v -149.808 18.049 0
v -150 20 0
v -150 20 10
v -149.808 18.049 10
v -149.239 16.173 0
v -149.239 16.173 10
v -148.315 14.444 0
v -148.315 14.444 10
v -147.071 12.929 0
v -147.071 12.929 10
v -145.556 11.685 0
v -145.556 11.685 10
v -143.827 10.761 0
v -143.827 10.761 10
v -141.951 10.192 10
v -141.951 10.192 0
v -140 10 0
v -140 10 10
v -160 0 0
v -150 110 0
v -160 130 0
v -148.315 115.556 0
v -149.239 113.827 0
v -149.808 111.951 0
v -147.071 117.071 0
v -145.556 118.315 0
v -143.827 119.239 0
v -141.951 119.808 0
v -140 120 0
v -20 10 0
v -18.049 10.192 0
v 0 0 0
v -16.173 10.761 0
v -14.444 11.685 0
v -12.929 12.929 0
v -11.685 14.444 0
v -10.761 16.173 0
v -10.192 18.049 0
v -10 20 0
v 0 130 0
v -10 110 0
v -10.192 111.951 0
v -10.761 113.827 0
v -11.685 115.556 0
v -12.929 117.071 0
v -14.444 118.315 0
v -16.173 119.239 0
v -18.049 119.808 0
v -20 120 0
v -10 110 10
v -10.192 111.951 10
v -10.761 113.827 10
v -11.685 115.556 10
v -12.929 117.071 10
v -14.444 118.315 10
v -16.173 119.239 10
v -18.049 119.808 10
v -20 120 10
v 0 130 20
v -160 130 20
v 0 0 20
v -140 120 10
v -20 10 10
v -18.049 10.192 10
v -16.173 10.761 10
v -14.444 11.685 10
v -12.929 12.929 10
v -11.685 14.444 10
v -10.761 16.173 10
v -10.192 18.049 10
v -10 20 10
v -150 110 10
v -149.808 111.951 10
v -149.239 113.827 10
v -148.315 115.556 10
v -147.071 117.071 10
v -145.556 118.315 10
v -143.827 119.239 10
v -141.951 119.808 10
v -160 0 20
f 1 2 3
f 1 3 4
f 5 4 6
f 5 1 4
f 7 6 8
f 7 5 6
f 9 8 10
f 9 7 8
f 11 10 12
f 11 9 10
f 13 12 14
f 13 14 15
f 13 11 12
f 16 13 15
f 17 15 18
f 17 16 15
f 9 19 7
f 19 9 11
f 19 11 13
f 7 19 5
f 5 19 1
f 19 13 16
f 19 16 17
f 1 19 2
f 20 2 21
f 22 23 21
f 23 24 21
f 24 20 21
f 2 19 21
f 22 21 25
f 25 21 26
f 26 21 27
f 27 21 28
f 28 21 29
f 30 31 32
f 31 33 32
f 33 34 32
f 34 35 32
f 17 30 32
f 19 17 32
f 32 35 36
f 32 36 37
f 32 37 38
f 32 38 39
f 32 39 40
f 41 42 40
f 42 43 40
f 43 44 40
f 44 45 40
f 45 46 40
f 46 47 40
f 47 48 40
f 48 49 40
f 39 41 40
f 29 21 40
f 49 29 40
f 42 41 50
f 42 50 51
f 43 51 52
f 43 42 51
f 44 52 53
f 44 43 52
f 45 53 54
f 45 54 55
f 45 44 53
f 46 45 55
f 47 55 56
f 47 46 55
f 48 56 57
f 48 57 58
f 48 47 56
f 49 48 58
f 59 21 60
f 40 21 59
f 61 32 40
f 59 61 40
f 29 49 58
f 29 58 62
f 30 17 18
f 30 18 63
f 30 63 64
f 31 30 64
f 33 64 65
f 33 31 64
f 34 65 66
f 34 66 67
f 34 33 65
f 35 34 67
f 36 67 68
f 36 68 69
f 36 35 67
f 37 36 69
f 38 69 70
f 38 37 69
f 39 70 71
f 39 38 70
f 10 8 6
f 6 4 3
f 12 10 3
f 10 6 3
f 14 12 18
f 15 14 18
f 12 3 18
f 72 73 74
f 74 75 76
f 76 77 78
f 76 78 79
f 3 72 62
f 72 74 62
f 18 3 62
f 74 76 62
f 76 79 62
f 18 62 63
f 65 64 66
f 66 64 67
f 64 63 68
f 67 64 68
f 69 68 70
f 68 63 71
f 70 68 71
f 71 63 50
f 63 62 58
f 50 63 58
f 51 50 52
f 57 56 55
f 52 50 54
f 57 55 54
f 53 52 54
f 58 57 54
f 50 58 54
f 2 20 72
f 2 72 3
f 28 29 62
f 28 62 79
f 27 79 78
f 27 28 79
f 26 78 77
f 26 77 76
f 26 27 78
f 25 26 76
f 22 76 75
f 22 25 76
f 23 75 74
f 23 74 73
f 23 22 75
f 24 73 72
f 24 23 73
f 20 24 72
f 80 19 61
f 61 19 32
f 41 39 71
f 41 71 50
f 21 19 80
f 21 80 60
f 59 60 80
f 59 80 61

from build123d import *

# Parameters (mm, degrees)
SKETCH1_W           = 160
SKETCH1_H           = 130
BOSS_EXTRUDE1_DEPTH = 20
CUT_EXTRUDE1_DEPTH  = 10


with BuildPart() as part:
    # Sketch1 → Boss-Extrude1 (new body)
    with BuildSketch(Plane.XY):
        with Locations((-80, 65)):
            Rectangle(SKETCH1_W, SKETCH1_H)
    extrude(amount=BOSS_EXTRUDE1_DEPTH)

    # Sketch2 → Cut-Extrude1 (cut)
    with BuildSketch(Plane(origin=(0, 0, 0), x_dir=(-1, 0, 0), z_dir=(0, 0, -1))):
        with BuildLine():
            Line((150, 110), (150, 20))
            ThreePointArc((150, 20), (147.071067812, 12.928932188), (140, 10))
            Line((140, 10), (20, 10))
            ThreePointArc((20, 10), (12.928932188, 12.928932188), (10, 20))
            Line((10, 20), (10, 110))
            ThreePointArc((10, 110), (12.928932188, 117.071067812), (20, 120))
            Line((20, 120), (140, 120))
            ThreePointArc((140, 120), (147.071067812, 117.071067812), (150, 110))
        make_face()
    extrude(amount=-CUT_EXTRUDE1_DEPTH, mode=Mode.SUBTRACT)


solid = part.part
